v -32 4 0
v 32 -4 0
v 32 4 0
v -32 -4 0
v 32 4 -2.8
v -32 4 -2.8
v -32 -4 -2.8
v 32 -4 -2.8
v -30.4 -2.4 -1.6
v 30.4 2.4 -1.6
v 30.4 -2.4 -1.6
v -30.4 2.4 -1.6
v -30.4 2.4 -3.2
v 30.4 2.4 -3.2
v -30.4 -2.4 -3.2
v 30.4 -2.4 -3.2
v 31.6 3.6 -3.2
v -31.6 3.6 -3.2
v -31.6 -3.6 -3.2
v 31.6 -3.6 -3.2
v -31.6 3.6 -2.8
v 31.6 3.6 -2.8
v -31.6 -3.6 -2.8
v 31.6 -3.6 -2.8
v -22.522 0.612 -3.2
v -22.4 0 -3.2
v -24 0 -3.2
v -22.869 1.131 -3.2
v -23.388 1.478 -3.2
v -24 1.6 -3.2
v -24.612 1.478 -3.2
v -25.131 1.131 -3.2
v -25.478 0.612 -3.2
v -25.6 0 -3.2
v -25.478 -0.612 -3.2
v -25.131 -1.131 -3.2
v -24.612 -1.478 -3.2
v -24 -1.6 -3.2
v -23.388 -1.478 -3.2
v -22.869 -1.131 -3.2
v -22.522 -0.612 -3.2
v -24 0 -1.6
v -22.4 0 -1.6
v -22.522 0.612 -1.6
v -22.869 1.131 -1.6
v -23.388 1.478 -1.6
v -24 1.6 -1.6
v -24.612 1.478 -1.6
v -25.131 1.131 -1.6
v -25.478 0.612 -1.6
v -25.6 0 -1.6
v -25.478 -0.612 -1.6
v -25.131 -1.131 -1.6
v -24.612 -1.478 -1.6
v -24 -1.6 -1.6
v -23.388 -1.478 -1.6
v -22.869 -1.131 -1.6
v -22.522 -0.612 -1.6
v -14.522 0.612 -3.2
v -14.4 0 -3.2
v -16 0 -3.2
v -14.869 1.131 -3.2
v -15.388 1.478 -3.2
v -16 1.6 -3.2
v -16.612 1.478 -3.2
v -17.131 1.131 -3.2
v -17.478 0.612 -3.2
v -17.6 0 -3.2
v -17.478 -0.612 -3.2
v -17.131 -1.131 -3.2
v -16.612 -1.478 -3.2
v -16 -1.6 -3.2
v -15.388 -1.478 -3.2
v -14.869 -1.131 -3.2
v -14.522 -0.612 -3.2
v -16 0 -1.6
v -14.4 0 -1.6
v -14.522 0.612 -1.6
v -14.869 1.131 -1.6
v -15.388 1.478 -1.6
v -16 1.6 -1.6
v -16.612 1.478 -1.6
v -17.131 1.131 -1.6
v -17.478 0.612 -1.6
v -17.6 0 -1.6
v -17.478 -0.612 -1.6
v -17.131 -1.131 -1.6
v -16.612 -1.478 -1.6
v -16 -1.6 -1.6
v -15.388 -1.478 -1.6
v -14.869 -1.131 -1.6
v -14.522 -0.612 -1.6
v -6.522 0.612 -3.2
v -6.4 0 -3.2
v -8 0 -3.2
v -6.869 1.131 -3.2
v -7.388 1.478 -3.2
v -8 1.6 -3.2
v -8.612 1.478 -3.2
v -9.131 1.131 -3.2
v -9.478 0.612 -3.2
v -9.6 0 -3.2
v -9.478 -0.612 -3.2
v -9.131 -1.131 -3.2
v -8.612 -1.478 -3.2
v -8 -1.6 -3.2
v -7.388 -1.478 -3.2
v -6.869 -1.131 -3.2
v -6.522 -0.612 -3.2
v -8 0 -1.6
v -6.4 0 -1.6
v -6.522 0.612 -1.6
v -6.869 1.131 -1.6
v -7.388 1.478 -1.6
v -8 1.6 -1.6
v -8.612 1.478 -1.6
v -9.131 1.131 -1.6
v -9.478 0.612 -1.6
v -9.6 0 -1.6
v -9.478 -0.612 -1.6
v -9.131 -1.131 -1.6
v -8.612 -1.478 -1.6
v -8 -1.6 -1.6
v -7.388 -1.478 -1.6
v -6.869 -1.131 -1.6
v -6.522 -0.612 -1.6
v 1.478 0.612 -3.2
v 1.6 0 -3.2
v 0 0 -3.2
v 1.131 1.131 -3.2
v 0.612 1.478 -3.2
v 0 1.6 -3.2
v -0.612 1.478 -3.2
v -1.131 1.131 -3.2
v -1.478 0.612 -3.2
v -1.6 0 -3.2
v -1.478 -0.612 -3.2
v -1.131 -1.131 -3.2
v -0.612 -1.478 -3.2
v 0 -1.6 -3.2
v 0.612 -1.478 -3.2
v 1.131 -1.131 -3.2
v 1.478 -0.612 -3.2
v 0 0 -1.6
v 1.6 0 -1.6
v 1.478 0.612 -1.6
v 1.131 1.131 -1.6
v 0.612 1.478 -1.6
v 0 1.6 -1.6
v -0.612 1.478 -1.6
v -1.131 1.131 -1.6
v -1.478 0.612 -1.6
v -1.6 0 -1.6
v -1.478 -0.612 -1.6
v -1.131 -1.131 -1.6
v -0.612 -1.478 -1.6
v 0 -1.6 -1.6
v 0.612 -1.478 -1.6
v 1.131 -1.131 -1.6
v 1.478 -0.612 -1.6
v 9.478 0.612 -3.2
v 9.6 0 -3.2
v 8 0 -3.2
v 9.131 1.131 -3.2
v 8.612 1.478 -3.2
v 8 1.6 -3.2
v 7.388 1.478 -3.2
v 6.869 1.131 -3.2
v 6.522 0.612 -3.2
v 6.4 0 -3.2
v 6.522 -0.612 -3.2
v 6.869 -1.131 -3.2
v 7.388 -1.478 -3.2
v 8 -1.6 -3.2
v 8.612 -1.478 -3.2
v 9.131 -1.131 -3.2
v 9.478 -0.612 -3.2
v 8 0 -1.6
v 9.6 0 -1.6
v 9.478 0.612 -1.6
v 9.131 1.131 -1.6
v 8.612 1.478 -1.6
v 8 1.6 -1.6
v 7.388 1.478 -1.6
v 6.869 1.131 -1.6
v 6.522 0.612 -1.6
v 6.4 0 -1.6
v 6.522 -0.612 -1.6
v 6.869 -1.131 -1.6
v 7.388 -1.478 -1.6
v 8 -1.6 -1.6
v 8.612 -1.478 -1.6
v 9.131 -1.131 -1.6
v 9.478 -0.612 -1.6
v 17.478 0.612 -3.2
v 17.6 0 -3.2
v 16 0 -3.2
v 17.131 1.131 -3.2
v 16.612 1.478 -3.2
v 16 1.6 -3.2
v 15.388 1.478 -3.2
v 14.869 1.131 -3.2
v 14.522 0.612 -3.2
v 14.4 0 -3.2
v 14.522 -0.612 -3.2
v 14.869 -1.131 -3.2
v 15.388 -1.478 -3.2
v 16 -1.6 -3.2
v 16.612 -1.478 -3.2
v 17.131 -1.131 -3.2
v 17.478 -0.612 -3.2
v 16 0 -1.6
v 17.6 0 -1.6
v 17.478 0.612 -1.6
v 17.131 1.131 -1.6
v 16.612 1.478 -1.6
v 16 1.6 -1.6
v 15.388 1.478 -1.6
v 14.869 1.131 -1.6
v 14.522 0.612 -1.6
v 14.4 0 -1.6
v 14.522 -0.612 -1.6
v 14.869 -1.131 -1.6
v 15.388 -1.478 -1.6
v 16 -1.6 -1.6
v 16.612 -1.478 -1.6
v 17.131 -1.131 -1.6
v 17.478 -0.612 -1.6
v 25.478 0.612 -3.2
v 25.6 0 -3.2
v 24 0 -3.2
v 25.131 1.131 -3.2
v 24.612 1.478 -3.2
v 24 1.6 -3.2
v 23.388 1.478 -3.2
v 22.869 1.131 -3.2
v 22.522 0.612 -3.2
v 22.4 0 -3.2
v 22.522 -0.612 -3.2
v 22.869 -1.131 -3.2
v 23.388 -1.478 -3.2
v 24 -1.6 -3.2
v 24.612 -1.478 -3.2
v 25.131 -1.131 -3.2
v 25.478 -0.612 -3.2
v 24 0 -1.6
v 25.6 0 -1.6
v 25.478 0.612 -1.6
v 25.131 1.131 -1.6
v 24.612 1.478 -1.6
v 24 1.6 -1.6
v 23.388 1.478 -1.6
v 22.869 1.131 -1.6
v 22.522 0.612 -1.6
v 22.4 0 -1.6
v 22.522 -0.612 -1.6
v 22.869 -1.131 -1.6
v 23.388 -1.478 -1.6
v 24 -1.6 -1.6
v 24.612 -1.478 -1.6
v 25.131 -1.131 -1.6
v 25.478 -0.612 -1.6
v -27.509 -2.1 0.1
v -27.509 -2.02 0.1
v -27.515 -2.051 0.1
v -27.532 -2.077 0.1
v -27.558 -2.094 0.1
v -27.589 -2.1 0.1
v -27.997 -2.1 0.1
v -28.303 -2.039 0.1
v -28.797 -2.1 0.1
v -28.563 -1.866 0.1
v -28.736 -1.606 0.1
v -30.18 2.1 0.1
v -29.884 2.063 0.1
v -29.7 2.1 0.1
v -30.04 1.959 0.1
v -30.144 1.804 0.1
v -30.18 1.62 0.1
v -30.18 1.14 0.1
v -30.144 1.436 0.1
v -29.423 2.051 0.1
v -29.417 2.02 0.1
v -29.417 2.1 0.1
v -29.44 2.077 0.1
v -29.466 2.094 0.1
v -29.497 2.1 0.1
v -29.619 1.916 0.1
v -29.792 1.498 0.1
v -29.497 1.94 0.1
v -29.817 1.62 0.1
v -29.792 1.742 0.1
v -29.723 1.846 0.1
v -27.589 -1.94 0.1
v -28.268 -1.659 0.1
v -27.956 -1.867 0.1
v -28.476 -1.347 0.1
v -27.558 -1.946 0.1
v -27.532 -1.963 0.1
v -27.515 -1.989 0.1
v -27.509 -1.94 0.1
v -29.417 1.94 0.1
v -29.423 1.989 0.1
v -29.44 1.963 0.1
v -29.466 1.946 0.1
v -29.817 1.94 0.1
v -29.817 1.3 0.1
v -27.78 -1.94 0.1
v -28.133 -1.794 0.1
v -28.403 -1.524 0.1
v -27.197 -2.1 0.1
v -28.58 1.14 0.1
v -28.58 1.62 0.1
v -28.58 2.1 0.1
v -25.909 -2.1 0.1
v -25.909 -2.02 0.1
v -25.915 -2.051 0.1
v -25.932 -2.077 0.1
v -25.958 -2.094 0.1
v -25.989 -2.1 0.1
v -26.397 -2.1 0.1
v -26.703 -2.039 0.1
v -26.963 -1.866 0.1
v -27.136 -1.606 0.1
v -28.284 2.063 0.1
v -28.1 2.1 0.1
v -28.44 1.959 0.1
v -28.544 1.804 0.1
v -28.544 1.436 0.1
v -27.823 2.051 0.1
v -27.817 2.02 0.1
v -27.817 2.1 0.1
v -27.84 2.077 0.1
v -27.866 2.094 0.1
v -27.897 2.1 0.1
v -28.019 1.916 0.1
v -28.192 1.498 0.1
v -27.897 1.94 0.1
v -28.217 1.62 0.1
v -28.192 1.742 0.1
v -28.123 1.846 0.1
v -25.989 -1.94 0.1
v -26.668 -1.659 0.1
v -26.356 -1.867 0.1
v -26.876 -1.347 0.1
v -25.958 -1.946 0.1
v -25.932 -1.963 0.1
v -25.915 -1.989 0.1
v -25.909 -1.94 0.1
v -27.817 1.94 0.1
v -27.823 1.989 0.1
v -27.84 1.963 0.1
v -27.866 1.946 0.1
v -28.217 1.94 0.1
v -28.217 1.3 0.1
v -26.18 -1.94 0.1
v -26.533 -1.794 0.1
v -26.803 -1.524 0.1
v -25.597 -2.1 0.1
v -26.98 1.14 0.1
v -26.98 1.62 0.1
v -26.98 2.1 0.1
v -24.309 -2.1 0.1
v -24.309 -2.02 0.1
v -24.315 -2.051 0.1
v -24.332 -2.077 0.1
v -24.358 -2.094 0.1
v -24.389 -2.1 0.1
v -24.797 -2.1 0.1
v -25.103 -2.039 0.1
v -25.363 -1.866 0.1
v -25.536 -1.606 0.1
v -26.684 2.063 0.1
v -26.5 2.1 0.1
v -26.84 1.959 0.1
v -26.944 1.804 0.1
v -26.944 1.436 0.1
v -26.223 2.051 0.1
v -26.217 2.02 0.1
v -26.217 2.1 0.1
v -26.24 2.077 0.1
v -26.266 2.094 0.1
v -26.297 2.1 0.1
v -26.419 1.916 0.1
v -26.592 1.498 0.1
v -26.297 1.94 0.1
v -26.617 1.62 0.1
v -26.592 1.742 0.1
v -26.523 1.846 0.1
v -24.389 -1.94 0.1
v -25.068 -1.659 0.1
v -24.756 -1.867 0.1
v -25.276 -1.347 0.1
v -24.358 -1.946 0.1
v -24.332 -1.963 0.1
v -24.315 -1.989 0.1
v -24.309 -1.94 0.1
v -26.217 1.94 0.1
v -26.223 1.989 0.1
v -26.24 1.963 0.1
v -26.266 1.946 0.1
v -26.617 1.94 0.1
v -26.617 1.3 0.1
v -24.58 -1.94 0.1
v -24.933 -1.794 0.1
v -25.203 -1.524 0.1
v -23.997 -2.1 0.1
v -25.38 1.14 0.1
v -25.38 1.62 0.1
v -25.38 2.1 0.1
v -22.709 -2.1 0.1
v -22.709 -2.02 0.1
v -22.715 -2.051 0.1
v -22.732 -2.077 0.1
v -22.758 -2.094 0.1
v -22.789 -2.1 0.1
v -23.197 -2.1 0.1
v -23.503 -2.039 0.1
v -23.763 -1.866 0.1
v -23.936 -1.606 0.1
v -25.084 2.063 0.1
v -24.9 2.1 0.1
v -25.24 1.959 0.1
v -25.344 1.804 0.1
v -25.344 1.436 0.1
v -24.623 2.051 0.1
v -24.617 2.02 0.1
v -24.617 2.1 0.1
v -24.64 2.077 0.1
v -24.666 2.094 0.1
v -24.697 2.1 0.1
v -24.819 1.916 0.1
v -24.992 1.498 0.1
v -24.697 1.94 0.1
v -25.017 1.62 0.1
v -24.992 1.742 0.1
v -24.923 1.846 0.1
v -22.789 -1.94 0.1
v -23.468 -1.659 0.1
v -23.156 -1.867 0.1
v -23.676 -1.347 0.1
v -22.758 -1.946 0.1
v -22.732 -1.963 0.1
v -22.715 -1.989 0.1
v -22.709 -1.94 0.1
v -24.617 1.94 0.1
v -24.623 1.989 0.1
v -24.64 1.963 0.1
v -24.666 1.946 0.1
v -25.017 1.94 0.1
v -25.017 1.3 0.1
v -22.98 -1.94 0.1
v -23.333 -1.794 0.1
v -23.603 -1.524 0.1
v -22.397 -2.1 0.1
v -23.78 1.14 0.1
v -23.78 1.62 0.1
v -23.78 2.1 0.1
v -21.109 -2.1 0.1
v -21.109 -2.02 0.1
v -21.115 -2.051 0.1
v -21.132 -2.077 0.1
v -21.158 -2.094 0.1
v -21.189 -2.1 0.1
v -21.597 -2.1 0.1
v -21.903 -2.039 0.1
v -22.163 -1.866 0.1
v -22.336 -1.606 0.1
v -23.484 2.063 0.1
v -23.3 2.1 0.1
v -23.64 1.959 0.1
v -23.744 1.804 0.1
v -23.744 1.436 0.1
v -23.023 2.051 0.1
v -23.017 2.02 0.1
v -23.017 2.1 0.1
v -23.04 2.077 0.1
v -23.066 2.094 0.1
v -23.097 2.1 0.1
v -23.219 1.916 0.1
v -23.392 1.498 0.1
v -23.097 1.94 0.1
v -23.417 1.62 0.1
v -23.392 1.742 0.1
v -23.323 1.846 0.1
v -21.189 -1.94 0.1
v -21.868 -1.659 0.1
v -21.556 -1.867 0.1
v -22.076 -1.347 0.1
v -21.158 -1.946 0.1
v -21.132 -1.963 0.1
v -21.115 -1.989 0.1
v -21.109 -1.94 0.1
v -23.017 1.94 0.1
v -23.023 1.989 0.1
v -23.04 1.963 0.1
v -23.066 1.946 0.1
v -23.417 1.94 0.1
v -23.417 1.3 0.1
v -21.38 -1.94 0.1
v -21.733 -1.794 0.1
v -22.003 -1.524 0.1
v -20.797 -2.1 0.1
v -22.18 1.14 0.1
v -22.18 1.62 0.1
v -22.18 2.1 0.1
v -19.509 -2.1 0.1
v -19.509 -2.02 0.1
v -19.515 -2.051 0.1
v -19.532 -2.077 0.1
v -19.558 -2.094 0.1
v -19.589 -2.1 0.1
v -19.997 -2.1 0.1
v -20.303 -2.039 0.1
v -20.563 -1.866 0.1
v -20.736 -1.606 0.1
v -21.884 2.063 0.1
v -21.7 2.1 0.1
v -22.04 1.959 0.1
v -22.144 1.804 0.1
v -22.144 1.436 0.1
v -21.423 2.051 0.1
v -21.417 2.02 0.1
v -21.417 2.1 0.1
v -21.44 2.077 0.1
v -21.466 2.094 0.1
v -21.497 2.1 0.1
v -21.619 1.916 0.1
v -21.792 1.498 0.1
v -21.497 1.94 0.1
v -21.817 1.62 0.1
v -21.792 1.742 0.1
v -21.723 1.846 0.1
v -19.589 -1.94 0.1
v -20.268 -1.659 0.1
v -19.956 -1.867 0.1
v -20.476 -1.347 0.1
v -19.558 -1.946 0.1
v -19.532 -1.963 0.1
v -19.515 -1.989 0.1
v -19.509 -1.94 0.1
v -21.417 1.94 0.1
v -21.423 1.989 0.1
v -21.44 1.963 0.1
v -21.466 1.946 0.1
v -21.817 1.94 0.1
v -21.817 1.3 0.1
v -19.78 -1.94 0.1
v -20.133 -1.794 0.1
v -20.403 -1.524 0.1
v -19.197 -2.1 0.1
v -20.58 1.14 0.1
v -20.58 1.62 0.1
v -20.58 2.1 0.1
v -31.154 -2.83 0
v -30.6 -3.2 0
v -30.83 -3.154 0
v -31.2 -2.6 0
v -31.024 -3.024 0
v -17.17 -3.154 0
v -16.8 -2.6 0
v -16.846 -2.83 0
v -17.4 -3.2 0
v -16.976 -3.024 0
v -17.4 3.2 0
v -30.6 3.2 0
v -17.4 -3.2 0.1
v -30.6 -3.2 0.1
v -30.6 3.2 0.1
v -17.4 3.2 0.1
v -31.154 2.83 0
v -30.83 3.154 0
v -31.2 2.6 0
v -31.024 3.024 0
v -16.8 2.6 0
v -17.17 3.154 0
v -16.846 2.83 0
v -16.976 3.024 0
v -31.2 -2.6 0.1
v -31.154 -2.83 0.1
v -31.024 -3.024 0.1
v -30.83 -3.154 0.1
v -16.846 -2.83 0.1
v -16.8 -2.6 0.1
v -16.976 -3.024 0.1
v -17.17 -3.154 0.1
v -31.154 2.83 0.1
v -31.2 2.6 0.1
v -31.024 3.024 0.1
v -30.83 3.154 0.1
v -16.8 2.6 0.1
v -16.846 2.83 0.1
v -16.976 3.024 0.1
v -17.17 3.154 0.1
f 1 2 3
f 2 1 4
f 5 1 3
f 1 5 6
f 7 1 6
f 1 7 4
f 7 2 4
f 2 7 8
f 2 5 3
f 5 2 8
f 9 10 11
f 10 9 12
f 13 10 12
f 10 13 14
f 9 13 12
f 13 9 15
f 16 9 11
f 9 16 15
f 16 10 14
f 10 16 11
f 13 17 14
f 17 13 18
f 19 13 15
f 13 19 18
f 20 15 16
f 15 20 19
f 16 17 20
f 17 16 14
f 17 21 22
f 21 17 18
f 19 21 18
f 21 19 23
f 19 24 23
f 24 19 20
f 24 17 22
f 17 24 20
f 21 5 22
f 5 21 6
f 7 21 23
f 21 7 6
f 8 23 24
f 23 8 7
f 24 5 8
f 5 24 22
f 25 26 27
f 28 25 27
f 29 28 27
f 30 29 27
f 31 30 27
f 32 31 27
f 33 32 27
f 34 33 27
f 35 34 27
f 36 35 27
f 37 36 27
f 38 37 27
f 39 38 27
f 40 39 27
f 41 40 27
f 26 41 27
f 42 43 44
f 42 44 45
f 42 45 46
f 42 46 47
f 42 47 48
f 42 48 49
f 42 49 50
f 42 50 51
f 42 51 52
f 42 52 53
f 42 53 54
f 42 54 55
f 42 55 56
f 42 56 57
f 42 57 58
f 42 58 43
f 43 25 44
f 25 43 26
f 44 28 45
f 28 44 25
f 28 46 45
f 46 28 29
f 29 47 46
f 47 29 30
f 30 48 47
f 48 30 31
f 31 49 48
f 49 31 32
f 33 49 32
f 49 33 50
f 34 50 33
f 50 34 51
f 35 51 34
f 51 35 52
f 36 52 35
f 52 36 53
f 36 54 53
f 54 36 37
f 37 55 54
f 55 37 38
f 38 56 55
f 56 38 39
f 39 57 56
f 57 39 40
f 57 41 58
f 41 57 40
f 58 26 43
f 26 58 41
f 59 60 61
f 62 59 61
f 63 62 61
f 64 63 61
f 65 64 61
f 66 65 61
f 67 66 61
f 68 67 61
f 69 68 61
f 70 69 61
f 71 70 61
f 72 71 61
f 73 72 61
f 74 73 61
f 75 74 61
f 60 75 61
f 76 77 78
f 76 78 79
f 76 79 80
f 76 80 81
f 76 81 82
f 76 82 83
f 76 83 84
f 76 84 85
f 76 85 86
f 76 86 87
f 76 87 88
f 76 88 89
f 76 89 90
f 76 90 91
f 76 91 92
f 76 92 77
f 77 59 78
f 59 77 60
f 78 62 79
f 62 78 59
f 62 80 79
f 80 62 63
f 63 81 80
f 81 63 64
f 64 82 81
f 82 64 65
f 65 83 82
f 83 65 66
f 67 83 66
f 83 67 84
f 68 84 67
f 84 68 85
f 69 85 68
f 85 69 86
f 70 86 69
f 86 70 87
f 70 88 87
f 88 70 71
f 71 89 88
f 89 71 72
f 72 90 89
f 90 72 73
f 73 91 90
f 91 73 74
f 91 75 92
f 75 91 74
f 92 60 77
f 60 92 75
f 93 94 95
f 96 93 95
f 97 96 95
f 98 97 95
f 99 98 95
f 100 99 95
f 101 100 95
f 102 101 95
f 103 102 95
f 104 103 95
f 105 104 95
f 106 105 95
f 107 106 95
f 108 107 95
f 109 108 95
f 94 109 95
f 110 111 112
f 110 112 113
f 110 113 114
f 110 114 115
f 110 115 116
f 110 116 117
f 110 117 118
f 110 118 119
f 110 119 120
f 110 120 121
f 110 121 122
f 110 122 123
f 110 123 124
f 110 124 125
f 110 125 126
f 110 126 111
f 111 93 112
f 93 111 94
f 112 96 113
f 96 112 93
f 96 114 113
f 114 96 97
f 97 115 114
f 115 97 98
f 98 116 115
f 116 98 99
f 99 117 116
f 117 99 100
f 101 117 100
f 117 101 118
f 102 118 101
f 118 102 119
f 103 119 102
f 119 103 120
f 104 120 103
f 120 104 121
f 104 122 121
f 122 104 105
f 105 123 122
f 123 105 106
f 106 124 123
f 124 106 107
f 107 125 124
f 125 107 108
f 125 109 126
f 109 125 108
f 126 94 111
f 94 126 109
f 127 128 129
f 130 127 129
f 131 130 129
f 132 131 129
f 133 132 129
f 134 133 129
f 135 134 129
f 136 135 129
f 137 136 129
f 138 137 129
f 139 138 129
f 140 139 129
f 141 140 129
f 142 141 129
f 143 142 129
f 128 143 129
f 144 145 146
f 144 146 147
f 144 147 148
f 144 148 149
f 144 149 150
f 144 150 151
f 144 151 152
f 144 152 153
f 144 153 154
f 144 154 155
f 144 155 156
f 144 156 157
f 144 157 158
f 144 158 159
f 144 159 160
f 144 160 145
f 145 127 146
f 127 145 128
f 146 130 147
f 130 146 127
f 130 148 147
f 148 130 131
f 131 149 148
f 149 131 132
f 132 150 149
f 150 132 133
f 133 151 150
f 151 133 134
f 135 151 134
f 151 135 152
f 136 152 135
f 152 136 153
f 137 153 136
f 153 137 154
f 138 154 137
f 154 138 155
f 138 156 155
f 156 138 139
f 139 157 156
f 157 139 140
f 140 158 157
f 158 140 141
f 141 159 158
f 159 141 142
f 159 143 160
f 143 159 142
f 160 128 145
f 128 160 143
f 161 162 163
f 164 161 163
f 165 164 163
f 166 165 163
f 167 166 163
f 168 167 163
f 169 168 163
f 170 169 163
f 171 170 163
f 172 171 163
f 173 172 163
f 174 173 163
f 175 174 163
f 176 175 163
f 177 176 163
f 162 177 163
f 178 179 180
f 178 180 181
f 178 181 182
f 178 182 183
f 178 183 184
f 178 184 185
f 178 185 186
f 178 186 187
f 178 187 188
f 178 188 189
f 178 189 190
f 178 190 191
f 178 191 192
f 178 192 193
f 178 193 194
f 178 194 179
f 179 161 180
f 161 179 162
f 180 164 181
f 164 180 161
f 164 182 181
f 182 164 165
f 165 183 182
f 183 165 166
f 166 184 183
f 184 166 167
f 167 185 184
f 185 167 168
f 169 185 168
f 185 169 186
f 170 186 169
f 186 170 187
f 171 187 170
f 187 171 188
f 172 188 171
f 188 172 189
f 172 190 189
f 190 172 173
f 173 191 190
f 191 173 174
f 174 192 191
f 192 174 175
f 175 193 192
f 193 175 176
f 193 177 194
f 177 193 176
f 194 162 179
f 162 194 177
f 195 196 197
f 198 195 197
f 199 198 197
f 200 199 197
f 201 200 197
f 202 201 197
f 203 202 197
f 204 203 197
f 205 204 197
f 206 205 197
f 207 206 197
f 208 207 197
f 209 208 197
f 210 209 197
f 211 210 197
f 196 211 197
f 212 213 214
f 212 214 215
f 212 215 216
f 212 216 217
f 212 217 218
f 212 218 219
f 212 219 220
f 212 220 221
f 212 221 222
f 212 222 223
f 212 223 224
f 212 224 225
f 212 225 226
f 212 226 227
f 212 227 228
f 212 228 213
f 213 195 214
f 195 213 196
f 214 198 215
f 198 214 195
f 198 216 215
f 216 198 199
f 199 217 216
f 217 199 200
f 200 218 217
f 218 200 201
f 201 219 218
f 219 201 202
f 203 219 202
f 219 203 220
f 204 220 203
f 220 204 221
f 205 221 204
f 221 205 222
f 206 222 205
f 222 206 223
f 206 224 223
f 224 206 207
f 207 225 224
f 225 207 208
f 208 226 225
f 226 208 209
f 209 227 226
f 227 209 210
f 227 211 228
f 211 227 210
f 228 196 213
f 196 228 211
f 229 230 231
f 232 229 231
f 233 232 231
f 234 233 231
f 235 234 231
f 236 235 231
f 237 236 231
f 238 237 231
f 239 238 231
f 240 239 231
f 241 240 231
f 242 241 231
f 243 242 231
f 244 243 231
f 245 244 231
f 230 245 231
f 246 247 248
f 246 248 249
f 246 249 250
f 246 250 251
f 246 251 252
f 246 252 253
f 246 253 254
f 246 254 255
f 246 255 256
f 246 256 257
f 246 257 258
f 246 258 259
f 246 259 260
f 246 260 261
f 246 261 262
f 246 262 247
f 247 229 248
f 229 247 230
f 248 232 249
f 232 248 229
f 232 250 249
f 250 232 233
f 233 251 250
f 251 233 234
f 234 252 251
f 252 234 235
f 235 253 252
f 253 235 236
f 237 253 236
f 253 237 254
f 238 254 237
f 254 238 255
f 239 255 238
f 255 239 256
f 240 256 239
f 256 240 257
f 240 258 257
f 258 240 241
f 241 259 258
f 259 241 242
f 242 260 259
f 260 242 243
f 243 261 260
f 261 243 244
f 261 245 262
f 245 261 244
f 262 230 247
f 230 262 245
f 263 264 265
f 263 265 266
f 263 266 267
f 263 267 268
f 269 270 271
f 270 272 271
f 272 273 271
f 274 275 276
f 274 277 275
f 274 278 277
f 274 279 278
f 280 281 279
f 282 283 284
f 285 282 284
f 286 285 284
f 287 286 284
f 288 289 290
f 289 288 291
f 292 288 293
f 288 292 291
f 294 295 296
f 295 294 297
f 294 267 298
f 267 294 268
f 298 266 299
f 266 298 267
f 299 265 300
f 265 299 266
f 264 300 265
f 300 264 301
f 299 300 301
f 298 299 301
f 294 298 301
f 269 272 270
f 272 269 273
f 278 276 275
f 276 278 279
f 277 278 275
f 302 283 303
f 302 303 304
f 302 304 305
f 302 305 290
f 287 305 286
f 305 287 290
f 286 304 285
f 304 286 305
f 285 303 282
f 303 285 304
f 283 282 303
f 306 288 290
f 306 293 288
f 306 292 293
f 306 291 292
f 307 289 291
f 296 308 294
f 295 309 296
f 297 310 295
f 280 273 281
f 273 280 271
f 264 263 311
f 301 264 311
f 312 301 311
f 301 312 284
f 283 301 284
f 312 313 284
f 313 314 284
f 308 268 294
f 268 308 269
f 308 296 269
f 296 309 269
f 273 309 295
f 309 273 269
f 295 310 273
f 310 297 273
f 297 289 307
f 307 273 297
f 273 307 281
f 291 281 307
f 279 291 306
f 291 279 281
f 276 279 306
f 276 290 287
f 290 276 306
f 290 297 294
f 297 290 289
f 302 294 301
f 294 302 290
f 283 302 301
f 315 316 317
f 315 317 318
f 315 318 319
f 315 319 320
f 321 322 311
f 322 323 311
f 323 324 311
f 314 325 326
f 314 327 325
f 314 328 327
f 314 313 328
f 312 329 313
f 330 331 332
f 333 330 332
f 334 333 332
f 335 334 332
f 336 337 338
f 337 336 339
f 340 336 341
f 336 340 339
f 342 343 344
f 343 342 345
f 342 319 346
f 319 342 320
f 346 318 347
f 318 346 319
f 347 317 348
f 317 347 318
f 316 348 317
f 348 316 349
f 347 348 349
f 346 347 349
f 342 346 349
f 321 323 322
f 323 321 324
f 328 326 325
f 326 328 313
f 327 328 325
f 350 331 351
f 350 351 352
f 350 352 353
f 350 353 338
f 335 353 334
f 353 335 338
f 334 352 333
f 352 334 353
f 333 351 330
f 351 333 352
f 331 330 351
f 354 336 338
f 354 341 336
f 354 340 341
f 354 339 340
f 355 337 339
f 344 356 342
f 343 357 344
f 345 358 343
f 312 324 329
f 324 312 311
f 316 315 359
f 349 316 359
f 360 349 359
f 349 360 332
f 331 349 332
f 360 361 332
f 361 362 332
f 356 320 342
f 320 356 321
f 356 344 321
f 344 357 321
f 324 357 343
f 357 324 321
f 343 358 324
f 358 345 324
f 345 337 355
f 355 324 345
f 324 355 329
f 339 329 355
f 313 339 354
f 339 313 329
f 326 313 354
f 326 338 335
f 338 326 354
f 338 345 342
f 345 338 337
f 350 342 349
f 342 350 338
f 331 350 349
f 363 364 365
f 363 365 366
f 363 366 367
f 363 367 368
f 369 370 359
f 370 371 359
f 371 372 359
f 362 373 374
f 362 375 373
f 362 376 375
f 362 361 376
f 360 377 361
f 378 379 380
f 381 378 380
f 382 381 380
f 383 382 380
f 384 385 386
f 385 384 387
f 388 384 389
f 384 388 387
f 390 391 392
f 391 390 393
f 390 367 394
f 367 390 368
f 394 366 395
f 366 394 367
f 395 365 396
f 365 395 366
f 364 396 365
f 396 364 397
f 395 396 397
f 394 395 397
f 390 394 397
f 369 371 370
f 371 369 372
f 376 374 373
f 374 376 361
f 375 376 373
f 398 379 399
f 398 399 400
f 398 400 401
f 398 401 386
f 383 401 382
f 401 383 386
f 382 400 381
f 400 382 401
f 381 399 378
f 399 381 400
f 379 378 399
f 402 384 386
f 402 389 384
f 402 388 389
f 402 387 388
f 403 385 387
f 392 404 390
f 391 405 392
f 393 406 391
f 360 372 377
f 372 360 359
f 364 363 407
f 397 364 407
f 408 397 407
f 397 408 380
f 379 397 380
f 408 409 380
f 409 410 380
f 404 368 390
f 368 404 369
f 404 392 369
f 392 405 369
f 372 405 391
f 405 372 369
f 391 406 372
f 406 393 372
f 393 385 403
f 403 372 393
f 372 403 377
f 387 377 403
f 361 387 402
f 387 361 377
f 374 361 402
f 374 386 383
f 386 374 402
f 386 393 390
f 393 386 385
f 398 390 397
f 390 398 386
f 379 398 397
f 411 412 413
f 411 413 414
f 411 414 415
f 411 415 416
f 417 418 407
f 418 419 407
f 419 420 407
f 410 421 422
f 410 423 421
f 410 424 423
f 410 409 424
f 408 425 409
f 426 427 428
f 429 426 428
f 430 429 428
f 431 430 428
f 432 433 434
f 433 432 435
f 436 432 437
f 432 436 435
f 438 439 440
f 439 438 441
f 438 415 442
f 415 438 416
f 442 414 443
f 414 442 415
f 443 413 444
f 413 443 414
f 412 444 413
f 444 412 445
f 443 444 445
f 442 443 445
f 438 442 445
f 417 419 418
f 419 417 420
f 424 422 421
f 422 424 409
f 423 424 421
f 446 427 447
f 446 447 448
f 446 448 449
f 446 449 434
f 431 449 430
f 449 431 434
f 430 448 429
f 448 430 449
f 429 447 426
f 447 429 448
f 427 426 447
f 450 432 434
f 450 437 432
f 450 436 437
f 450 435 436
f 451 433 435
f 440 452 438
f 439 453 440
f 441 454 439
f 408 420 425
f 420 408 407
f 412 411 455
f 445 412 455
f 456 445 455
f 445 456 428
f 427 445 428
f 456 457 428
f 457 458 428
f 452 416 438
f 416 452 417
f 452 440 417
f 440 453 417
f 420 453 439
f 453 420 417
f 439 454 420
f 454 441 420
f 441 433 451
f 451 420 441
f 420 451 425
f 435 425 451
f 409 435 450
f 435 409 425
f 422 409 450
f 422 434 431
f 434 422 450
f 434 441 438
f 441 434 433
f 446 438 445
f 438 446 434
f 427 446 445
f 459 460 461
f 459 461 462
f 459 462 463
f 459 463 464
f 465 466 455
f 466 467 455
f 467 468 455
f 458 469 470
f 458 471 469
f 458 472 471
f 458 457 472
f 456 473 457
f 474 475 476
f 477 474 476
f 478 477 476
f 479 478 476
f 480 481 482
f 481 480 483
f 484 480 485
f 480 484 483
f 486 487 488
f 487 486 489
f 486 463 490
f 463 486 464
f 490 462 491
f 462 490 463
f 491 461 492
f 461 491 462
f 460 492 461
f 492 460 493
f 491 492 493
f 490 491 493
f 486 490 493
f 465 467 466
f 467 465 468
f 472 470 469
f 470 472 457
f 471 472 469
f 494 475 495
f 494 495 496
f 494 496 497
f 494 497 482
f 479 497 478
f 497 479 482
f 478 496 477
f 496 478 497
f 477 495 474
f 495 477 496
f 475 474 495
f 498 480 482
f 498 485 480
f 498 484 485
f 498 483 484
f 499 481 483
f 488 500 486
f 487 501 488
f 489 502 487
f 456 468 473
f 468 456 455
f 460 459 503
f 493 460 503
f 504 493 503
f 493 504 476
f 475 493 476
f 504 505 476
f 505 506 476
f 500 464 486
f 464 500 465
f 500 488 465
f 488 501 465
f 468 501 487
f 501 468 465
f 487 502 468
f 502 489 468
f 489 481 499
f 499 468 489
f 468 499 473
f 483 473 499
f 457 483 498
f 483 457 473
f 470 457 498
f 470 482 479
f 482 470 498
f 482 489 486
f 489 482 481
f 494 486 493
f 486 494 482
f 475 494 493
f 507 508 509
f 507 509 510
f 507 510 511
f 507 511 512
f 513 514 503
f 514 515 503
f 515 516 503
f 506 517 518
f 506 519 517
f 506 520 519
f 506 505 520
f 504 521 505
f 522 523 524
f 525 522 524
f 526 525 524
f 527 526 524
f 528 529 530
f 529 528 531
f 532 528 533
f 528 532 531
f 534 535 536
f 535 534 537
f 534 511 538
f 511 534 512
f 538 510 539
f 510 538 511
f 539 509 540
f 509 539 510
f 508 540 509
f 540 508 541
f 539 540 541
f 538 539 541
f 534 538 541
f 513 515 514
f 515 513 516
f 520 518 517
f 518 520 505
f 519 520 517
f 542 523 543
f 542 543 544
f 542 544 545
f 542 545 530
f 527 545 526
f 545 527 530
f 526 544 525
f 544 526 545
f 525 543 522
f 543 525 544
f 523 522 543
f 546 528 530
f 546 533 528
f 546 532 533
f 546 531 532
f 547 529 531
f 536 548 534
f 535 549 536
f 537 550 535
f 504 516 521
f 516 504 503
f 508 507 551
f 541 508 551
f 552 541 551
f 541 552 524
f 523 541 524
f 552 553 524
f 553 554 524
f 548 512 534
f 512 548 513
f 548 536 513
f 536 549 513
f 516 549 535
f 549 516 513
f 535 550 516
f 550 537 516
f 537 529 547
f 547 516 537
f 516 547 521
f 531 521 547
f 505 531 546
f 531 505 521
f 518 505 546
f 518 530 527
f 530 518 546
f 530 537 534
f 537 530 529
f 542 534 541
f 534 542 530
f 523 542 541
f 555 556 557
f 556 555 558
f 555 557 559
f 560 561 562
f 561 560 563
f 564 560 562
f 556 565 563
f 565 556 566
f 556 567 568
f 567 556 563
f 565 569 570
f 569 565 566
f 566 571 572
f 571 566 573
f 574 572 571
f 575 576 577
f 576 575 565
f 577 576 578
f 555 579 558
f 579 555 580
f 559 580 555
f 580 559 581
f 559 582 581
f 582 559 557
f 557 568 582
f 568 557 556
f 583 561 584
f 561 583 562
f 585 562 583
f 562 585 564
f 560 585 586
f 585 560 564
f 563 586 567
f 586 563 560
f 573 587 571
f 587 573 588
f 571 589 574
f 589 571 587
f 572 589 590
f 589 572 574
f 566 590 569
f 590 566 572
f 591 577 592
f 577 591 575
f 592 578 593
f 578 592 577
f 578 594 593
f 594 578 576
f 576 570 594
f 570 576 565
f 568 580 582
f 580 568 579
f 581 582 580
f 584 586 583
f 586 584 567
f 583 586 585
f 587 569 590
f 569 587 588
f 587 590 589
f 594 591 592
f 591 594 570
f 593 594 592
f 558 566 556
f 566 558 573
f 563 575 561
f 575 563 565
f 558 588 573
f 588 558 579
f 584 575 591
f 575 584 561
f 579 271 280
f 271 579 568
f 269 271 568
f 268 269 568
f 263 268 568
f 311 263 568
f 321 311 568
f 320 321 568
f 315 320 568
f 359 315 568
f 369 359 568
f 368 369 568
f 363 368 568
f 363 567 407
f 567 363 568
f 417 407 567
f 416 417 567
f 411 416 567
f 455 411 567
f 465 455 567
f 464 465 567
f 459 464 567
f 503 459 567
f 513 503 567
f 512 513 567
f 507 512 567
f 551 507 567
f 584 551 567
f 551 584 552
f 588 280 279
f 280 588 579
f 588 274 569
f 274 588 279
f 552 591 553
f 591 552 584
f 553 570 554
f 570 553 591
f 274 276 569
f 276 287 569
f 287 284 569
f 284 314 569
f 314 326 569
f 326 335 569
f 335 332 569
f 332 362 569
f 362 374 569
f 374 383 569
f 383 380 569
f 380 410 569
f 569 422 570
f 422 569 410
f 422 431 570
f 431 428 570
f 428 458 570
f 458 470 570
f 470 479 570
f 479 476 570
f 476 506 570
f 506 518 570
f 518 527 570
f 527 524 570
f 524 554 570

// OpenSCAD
use <../lib.scad>
use <4162.scad>
use <6177741t.scad>
function ldraw_lib__4162d0n() = [
// 0 Tile  1 x  8 with Six Black Air Scope on Transparent Background Left Sticker
// 0 Name: 4162d0n.dat
// 0 Author: Alfred Schmitz [AlfredS]
// 0 !LDRAW_ORG Shortcut UPDATE 2026-08
// 0 !LICENSE Licensed under CC BY 4.0 : see CAreadme.txt
// 
// 0 BFC CERTIFY CCW
  [0,"BFC","CERTIFY"],
  [0,"BFC","CCW"],
// 
// 0 !CATEGORY Sticker Shortcut
// 0 !KEYWORDS AMG, GT3, Mercedes, Set 75877, Speed Champions
// 
// 0 !HISTORY 2026-08-31 [OrionP] Official Update 2026-08
// 
// 1 16 0 0 0 1 0 0 0 1 0 0 0 1 4162.dat
  [1,16,0,0,0,1,0,0,0,1,0,0,0,1, ldraw_lib__4162()],
// 1 16 -60 0 0 1 0 0 0 1 0 0 0 1 6177741t.dat
  [1,16,-60,0,0,1,0,0,0,1,0,0,0,1, ldraw_lib__6177741t()],
];
module ldraw_lib__4162d0n(step=0, col=false, unit=2/5, alt=false, line=0.2, solid=!$preview)
    makepoly(ldraw_lib__4162d0n(), step=step, col=col, unit=unit, alt=alt, line=line, solid=solid);
ldraw_lib__4162d0n(line=0.2);
